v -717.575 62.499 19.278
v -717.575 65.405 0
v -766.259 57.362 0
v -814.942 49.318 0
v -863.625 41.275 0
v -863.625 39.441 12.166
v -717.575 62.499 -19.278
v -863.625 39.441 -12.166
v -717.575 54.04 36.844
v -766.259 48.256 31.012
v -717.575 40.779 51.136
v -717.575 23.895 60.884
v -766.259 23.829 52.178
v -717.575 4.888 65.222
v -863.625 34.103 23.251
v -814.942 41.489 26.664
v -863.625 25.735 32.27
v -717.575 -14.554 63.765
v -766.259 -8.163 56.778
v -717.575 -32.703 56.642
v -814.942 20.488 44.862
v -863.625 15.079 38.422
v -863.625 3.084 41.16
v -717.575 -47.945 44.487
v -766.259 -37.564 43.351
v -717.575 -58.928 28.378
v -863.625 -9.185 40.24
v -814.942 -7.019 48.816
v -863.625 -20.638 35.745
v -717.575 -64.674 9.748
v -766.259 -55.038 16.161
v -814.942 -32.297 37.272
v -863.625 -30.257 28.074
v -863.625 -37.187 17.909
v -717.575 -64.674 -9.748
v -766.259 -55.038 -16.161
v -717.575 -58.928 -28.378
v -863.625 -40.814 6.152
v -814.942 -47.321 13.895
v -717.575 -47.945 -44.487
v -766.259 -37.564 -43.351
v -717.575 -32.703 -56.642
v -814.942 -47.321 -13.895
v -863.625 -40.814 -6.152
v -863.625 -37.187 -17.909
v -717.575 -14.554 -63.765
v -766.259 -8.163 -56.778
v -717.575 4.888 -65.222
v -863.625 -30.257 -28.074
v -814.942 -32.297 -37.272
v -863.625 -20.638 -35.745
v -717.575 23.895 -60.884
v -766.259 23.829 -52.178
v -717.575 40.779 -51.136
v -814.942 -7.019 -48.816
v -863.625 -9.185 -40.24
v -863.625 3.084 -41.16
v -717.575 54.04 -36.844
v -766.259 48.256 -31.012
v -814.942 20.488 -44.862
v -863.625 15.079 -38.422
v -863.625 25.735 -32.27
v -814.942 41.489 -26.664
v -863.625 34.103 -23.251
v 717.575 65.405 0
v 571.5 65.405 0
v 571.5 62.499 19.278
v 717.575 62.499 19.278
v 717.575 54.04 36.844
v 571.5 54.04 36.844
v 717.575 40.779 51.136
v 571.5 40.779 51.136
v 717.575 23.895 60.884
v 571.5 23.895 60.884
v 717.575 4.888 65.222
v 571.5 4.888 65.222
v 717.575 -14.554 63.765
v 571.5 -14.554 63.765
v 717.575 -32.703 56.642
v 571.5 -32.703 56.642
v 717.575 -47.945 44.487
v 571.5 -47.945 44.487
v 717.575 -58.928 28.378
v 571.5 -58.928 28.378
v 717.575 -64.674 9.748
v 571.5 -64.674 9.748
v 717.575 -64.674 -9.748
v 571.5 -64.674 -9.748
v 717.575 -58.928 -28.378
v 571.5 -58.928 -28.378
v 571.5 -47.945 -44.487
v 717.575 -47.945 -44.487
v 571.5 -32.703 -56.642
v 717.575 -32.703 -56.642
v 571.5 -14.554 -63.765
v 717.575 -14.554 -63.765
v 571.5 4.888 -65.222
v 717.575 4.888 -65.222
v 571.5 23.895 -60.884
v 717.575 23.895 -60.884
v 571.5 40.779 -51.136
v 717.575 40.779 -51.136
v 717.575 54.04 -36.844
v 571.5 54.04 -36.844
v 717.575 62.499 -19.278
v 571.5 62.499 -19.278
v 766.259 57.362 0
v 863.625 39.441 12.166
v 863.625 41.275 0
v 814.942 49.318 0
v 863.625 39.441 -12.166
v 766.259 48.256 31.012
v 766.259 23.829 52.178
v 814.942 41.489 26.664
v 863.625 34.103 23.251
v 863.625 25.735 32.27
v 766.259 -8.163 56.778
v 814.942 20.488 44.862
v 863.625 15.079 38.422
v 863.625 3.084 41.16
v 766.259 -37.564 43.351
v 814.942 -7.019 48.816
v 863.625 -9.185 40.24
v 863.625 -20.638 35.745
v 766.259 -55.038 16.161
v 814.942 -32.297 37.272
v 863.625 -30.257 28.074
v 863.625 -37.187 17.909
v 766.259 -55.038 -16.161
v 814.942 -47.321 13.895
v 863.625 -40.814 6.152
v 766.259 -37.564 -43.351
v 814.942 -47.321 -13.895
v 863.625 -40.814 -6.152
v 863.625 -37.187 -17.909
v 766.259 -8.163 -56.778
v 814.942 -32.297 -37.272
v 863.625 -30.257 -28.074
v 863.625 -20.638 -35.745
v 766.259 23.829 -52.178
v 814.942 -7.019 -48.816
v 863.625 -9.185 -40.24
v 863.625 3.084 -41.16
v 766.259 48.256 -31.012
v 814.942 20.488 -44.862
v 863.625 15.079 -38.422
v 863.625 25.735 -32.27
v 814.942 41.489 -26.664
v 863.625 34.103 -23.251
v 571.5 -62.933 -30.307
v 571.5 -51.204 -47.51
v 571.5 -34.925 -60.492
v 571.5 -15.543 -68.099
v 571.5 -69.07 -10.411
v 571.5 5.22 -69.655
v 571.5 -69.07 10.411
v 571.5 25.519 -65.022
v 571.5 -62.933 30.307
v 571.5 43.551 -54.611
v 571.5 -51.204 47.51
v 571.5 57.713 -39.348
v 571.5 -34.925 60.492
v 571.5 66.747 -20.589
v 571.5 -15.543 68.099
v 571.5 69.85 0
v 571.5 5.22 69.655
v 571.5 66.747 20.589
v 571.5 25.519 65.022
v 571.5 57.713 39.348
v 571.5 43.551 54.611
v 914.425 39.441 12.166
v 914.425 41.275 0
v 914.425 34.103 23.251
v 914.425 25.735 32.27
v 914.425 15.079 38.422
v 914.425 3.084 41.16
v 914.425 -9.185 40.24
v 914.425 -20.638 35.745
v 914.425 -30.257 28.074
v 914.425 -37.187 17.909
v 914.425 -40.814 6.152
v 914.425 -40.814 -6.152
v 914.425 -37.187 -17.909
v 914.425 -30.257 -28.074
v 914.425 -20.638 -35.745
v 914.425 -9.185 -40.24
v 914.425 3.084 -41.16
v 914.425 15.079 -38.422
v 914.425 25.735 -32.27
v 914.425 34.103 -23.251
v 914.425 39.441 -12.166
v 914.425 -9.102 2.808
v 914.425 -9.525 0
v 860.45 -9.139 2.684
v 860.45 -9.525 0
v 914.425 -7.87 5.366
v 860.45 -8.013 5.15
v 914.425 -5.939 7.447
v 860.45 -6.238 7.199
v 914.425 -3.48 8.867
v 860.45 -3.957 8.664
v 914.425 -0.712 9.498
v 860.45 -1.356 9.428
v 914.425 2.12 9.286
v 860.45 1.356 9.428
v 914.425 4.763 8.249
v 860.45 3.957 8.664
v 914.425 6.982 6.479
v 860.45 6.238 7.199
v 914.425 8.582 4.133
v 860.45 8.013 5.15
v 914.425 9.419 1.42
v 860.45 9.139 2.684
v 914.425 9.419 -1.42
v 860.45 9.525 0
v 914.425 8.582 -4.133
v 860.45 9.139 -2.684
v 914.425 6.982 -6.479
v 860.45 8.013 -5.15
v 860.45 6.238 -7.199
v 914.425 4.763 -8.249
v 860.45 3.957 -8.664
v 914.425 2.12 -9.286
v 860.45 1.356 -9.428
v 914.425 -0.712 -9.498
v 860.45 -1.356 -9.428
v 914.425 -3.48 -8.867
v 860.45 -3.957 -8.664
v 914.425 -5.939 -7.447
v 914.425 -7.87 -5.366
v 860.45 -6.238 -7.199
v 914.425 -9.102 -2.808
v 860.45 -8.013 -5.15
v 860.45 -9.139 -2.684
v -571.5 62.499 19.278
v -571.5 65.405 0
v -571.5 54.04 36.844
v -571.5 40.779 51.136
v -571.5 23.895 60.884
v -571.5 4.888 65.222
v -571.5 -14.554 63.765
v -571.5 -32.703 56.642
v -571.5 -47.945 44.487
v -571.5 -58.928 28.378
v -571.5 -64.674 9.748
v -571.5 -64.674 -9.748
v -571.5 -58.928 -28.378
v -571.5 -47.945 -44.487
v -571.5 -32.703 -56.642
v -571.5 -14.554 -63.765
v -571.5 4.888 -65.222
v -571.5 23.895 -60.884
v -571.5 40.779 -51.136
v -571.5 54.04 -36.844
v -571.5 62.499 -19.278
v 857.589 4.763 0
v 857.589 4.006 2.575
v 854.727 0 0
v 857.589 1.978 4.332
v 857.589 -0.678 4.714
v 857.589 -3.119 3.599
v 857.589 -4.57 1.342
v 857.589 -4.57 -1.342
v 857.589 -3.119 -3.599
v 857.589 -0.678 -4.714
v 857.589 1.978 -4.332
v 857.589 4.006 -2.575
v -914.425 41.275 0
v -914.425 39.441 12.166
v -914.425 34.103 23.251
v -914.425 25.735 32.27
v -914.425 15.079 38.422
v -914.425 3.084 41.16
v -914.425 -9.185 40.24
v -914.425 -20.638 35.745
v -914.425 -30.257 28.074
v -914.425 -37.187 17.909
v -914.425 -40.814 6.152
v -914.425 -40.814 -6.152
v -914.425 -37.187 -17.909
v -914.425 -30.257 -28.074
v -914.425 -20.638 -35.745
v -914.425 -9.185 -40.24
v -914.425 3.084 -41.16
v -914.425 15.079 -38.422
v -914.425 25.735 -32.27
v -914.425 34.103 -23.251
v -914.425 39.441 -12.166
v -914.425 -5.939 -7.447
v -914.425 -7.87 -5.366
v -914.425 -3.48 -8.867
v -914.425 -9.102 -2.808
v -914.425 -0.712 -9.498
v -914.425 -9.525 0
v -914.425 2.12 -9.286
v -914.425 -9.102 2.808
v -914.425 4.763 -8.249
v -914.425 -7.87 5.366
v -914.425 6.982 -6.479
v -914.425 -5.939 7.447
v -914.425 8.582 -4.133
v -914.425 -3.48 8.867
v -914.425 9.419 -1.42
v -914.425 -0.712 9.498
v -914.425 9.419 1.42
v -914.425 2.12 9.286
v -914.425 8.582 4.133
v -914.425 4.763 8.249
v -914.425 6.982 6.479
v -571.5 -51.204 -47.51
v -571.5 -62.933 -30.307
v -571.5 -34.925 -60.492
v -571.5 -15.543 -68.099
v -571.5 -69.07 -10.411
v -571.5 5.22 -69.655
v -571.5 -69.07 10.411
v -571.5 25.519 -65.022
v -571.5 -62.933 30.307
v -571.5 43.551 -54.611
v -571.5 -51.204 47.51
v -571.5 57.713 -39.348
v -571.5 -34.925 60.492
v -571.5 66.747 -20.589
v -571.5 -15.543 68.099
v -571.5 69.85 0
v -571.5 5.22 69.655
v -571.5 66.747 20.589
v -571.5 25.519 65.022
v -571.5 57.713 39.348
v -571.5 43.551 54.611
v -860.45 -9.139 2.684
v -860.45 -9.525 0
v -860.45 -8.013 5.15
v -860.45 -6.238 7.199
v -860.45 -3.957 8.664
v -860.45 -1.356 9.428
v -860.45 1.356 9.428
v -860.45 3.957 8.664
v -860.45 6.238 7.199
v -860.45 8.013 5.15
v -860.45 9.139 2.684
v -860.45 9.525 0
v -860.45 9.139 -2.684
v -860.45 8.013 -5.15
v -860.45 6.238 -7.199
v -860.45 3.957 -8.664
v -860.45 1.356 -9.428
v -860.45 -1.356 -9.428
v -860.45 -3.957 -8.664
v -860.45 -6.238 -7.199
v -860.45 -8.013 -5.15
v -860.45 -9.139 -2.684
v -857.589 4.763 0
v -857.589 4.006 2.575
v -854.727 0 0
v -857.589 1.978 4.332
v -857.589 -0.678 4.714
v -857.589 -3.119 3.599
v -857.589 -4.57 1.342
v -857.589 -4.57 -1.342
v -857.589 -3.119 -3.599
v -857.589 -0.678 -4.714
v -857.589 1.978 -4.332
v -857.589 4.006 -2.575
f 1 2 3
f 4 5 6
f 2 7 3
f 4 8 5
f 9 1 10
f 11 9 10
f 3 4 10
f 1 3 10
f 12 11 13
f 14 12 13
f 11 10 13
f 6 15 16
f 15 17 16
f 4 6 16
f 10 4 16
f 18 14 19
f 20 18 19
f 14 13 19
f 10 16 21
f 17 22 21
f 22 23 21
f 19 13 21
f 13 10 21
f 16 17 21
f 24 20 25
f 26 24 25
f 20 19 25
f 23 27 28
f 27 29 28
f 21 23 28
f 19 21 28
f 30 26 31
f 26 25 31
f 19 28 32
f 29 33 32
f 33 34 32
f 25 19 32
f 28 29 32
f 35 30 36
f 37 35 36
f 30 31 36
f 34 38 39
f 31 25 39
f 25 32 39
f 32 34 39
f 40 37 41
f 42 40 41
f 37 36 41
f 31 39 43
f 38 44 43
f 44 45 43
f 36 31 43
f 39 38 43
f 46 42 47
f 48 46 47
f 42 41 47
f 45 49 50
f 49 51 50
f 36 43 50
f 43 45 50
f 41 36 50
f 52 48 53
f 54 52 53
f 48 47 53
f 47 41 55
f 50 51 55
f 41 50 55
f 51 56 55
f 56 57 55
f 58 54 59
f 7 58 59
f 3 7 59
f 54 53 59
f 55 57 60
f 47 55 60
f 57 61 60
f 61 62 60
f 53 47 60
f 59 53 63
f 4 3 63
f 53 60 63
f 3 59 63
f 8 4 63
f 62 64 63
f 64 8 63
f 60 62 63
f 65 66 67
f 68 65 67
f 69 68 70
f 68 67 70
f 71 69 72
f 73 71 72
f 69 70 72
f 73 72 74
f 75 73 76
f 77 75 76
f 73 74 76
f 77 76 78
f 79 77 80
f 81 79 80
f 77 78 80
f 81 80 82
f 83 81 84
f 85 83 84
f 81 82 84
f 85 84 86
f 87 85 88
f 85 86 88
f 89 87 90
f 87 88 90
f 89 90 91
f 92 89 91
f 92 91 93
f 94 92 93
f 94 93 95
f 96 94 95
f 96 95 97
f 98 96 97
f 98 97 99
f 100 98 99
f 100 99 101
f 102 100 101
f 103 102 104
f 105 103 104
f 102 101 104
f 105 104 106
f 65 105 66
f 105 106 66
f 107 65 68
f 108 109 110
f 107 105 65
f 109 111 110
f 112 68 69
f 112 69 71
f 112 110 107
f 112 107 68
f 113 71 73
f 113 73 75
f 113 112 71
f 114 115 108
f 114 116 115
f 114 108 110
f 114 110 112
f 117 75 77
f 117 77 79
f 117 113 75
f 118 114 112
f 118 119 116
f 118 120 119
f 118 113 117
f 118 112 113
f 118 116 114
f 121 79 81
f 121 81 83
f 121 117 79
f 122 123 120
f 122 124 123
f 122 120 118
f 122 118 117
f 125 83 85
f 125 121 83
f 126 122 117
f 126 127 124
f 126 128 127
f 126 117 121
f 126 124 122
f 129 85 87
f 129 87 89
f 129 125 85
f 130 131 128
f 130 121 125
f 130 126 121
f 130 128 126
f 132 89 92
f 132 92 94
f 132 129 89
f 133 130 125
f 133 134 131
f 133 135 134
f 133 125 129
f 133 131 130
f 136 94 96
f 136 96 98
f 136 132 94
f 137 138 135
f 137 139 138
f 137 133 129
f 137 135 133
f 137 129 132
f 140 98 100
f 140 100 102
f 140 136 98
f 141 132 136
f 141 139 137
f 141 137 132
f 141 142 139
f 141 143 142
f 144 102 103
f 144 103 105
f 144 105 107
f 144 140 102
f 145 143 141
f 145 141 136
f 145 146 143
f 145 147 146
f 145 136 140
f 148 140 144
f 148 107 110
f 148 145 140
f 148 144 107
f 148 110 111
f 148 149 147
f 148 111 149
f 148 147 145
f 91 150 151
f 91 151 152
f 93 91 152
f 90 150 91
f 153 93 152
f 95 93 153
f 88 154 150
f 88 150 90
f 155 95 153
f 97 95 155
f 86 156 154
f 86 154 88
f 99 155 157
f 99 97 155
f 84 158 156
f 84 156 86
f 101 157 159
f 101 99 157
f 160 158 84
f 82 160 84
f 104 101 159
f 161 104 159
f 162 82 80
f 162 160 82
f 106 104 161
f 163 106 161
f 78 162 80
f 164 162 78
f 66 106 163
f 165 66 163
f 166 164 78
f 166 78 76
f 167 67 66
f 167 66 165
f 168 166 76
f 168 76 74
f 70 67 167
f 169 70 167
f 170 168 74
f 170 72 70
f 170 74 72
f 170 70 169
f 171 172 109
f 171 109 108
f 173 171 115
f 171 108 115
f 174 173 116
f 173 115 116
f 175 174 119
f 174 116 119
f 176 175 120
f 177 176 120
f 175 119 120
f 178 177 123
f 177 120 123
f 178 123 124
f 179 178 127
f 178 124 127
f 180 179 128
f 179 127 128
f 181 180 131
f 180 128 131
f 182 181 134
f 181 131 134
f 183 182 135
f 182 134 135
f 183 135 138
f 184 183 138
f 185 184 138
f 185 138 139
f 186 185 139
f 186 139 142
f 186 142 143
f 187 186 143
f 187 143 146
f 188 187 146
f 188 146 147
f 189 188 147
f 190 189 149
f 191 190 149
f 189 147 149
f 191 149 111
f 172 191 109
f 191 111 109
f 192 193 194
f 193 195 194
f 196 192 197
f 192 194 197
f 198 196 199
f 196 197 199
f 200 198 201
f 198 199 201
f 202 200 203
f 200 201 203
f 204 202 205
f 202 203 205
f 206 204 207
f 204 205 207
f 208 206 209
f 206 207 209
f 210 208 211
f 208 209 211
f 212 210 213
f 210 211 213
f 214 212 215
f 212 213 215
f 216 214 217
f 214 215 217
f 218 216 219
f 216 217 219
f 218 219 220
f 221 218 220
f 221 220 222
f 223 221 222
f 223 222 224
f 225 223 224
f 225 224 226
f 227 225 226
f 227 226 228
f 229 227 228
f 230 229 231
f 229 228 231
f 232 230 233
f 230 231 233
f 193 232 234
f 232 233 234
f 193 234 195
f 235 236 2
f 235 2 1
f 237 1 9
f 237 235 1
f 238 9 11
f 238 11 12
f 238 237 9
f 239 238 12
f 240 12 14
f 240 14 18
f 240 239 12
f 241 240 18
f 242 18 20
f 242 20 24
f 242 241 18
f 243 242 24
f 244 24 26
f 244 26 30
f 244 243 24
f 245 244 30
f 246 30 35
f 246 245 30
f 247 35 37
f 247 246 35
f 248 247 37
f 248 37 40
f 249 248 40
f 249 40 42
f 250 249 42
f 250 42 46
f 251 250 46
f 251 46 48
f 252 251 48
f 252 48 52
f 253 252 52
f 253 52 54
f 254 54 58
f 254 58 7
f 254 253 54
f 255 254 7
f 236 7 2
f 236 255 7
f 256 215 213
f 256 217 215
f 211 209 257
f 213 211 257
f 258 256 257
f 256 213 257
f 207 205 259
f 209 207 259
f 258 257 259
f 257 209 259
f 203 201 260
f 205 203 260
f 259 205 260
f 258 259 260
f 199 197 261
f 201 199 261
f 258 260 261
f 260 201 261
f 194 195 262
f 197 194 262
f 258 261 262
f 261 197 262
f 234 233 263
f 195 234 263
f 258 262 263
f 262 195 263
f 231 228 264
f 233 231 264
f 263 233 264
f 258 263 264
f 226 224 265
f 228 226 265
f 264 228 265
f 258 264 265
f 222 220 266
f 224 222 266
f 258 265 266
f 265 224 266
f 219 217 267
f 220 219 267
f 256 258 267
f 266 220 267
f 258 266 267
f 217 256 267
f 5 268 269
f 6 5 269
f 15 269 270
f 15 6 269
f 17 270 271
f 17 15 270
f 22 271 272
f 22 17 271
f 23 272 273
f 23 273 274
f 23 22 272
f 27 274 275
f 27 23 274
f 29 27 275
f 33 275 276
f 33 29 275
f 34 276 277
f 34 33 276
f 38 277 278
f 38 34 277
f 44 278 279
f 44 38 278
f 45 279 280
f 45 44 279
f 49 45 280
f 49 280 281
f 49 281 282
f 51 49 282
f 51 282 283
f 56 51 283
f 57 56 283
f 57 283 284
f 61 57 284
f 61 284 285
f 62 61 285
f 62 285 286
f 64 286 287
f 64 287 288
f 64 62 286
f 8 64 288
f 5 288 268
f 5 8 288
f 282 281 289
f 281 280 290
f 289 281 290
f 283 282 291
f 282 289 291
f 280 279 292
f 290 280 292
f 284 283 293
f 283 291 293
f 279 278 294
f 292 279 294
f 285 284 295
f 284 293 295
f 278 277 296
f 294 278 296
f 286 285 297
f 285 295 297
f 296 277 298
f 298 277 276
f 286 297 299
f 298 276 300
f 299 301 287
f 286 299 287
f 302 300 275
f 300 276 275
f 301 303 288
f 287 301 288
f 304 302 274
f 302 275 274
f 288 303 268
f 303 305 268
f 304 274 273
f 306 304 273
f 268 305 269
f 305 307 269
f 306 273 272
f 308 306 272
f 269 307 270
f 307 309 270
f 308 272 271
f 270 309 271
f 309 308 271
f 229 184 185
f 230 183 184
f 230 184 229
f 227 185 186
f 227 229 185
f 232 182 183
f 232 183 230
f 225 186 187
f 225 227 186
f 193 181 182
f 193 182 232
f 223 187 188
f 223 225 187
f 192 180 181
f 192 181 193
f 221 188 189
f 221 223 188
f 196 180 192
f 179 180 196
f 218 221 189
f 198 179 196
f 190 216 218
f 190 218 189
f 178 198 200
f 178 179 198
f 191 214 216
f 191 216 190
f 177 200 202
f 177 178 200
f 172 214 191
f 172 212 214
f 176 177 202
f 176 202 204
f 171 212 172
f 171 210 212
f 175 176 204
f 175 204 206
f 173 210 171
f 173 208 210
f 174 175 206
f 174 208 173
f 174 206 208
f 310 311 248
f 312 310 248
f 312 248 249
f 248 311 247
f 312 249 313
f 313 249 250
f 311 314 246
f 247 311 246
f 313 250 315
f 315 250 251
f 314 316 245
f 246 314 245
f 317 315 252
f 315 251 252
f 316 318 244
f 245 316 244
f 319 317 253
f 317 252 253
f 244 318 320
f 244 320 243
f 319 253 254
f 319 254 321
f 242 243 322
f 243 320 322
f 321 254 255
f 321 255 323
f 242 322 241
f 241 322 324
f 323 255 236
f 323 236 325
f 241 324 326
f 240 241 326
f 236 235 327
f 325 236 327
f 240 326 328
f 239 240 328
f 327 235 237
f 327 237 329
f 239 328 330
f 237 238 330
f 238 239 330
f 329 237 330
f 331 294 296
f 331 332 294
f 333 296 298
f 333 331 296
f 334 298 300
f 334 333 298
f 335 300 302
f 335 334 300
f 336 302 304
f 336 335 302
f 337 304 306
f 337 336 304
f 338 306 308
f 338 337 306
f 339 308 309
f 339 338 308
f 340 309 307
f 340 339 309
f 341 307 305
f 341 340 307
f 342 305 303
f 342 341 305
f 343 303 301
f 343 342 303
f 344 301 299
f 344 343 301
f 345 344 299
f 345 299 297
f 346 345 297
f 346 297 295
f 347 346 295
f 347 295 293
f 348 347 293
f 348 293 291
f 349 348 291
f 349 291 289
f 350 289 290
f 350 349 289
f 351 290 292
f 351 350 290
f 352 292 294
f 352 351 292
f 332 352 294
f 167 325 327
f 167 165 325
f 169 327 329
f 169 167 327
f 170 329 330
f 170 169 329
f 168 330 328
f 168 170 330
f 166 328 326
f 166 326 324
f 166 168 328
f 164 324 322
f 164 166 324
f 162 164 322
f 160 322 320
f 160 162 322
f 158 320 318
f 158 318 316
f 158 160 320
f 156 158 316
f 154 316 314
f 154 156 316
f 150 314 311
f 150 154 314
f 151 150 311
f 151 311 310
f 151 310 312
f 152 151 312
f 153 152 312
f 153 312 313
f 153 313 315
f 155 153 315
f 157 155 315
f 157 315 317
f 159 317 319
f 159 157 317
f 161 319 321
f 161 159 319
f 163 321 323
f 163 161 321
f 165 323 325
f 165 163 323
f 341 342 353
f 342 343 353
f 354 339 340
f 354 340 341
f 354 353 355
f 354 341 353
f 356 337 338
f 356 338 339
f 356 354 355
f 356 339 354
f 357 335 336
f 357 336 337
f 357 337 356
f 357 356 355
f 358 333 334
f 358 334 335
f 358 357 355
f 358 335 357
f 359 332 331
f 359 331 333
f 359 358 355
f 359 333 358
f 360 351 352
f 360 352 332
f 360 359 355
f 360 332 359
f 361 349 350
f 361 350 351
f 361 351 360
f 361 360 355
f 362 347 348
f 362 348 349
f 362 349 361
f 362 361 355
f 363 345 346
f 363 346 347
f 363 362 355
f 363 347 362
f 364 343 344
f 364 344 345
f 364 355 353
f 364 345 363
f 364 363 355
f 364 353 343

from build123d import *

# Parameters (mm, degrees)
F0_R      = 69.85
F1_DEPTH  = 571.5
F2_R      = 65.405
F3_DEPTH  = 146.0754
F3_FACE_R = 65.405
F5_R      = 41.275
F7_R      = 41.275
F8_DEPTH  = 50.8
F10_D     = 19.05
F10_DEPTH = 53.975
F10_TIP   = 5.7231973962


with BuildPart() as f1:
    # F0 (on Right) → F1 (new body, symmetric)
    with BuildSketch(Plane.YZ):
        Circle(F0_R)
    extrude(amount=F1_DEPTH, both=True)

    # F2 (on face) → F3 (join)
    with BuildSketch(Plane.YZ.offset(571.5)):
        Circle(F2_R)
    extrude(amount=F3_DEPTH)

    # F3_face (on face) → F6 section 0
    with BuildSketch(Plane.YZ.offset(717.5754)):
        Circle(F3_FACE_R)
    # F5 (on offset) → F6 section 1
    with BuildSketch(Plane.YZ.offset(863.6254)):
        Circle(F5_R)
    loft()

    # F7 (on face) → F8 (join)
    with BuildSketch(Plane.YZ.offset(863.6254)):
        Circle(F7_R)
    extrude(amount=F8_DEPTH)

    # F10
    with Locations(Plane.YZ.offset(914.4254)):
        with Locations((0, 0)):
            Hole(F10_D / 2, depth=F10_DEPTH)
            with Locations((0, 0, -(F10_DEPTH + F10_TIP / 2))):  # 118° drill point
                Cone(0, F10_D / 2, F10_TIP, mode=Mode.SUBTRACT)

    # F11: F1 across plane


with BuildPart() as f1_1:
    add(f1.part)
    add(f1.part.mirror(Plane.YZ))


solid = f1_1.part
